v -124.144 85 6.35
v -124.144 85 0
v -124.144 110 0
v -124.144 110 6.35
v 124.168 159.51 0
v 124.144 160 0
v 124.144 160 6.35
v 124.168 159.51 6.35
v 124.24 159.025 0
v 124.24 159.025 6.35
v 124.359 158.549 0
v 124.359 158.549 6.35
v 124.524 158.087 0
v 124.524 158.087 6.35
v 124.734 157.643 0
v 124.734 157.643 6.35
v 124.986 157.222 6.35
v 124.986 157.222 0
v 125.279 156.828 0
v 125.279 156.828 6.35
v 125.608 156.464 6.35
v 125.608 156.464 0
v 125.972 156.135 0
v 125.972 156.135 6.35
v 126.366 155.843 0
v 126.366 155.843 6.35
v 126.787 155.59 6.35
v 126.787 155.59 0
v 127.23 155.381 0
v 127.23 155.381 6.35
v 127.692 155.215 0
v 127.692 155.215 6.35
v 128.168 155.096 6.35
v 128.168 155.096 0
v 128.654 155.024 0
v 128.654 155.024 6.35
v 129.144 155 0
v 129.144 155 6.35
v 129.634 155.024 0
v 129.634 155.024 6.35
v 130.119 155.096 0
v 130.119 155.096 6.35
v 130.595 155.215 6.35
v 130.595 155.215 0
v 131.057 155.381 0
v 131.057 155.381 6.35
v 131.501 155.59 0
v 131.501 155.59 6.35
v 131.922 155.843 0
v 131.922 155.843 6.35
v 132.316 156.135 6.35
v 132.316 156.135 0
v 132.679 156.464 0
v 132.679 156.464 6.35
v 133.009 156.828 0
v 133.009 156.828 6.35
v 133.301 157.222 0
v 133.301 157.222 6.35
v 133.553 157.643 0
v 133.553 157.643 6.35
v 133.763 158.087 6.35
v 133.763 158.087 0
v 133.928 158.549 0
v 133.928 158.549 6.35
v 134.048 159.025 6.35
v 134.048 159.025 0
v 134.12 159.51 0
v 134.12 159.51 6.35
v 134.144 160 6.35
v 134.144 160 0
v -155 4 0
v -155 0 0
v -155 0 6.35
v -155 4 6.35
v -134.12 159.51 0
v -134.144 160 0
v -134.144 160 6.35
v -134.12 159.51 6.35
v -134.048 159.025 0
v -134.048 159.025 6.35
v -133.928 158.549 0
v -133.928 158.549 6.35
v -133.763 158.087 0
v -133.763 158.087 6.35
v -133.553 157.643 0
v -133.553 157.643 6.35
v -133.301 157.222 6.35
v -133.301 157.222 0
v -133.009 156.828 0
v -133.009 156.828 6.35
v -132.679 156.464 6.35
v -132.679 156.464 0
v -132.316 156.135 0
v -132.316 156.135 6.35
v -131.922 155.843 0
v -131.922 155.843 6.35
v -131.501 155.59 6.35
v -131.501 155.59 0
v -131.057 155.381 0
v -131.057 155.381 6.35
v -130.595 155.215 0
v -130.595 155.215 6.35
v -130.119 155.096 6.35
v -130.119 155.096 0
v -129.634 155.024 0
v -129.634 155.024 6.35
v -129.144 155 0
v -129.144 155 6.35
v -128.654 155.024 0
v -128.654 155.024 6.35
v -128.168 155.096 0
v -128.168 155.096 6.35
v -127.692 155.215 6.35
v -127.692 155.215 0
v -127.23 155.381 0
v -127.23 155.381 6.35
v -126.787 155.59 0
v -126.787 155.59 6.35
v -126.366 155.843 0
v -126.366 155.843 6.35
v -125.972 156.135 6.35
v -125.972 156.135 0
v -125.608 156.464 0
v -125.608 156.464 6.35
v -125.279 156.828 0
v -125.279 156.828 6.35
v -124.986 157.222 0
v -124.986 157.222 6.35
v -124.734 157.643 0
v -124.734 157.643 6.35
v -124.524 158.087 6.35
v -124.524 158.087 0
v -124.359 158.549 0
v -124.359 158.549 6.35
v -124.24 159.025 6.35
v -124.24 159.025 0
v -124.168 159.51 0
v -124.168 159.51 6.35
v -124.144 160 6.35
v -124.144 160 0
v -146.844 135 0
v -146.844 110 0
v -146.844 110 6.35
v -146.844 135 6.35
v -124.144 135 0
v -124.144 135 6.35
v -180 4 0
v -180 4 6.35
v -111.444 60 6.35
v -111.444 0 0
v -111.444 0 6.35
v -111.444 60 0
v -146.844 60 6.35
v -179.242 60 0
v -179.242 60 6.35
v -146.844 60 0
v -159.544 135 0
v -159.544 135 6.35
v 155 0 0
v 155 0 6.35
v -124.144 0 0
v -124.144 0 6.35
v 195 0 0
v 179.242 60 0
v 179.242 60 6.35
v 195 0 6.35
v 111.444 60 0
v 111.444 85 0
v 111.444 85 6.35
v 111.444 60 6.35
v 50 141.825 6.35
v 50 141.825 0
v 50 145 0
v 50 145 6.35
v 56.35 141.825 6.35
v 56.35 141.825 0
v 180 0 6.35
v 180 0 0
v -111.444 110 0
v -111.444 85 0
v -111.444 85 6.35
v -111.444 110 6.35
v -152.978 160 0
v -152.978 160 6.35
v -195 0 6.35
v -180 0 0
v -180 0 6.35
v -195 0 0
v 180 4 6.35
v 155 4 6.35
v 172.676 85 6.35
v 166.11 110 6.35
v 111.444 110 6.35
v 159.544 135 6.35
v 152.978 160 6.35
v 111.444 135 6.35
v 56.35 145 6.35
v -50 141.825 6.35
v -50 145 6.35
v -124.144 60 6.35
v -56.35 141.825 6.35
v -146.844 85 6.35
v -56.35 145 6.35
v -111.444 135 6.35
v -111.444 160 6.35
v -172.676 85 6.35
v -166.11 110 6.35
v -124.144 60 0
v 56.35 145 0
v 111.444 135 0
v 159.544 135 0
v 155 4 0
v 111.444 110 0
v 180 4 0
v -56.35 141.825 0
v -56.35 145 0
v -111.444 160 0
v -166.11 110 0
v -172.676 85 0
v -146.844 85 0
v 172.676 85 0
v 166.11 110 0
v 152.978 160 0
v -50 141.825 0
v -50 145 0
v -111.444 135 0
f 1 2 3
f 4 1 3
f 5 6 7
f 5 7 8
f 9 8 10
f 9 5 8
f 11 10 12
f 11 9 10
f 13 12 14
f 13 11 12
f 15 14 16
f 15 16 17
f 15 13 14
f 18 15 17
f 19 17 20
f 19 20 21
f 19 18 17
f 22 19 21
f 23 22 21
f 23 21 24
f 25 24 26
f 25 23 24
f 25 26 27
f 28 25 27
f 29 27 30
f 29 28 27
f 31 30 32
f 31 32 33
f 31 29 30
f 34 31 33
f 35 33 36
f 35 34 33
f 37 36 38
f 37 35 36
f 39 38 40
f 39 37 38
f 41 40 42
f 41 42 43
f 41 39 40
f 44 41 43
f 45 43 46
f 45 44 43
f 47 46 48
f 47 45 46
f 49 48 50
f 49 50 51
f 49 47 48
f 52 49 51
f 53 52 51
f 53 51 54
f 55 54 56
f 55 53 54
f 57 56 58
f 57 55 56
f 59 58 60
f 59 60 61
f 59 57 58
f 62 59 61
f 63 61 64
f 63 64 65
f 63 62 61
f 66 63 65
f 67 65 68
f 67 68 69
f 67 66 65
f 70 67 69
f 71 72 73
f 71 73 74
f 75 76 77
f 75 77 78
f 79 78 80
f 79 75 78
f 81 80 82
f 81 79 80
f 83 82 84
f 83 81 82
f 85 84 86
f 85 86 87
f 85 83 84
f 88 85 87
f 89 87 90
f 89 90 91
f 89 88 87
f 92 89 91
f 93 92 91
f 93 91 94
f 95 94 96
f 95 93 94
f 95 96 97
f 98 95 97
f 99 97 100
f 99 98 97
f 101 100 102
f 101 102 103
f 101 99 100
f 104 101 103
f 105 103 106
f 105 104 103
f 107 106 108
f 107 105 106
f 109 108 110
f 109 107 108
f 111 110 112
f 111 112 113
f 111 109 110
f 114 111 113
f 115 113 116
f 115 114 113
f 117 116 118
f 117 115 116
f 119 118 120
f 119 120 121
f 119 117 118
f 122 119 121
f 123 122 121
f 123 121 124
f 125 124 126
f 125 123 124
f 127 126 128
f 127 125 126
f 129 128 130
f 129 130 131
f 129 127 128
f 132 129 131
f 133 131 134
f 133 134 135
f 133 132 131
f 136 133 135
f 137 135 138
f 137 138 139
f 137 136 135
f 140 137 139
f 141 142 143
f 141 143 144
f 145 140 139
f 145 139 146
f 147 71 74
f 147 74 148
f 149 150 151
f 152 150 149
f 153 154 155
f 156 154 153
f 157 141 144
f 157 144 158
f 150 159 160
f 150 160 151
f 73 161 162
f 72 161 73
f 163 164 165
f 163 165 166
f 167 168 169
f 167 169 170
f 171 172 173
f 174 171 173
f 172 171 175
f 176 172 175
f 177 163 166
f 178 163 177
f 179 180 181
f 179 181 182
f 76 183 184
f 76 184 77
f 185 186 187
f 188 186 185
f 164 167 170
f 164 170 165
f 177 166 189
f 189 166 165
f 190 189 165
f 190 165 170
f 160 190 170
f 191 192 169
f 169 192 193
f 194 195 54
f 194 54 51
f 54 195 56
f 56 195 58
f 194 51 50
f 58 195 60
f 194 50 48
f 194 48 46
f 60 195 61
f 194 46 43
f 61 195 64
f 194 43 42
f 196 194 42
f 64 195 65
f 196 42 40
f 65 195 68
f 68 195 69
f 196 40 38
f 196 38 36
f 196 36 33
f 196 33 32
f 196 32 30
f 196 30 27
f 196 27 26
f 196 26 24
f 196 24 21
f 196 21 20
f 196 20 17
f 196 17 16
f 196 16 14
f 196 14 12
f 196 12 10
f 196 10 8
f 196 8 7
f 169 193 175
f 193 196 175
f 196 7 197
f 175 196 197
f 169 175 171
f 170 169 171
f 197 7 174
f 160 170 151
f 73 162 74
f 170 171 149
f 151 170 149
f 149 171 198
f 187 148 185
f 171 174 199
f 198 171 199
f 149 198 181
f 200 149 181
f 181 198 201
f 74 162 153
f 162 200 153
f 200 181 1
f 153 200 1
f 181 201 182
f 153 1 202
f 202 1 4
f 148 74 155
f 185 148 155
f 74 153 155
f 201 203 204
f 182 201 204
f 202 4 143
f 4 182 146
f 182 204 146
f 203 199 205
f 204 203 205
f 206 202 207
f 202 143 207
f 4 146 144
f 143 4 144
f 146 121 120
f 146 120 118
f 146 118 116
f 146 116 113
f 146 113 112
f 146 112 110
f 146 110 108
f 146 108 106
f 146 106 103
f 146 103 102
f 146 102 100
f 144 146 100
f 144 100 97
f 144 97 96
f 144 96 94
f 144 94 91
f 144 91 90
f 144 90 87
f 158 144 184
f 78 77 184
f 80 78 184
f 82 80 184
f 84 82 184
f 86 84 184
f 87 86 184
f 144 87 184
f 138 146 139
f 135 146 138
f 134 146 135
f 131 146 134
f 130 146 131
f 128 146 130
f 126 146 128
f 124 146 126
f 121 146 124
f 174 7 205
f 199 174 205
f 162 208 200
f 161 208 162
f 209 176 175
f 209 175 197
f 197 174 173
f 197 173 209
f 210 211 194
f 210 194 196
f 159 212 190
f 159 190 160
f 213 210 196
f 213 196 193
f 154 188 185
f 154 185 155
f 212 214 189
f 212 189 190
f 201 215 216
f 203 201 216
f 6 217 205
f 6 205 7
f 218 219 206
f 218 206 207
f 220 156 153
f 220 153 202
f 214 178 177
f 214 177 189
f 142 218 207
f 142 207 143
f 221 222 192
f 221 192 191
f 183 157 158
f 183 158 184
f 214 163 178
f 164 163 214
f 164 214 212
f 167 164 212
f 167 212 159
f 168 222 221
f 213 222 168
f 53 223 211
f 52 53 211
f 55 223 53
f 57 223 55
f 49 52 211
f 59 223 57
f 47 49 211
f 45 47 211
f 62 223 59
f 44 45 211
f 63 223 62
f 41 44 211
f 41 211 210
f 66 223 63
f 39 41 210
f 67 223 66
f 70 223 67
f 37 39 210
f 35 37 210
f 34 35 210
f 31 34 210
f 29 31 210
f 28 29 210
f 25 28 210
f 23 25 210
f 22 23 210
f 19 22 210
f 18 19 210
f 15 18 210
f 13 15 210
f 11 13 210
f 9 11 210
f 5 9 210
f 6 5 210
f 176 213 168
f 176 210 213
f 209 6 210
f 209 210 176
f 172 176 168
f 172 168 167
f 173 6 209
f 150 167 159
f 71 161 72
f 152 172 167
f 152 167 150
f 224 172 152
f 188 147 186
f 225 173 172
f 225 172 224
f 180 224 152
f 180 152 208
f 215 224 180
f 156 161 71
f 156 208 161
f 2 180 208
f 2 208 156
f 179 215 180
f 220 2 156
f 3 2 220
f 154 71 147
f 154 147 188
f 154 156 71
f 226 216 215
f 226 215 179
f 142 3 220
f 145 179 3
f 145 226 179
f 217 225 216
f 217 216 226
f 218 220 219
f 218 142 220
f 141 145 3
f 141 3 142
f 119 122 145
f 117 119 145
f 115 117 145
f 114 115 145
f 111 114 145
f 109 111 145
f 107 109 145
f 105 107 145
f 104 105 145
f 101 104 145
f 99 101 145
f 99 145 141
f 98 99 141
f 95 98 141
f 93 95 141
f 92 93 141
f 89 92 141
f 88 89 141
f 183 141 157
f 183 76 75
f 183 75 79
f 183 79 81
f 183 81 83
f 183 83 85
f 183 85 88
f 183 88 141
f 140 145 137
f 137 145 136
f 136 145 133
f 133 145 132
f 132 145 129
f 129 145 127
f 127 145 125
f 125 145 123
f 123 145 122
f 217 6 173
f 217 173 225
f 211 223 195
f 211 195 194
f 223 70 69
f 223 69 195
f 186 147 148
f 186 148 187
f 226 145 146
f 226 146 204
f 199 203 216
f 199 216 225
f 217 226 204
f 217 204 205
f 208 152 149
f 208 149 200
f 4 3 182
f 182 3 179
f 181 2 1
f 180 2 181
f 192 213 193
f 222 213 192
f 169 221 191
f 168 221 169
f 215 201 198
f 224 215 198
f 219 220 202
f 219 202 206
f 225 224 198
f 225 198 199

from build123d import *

# Parameters (mm, degrees)
SKETCH1_W      = 6.35
SKETCH1_H      = 3.175
SKETCH1_W_2    = 12.7
SKETCH1_H_2    = 25
EXTRUDE1_DEPTH = 6.35


with BuildPart() as part:
    # Sketch1 → Extrude1 (new body)
    with BuildSketch(Plane.XY):
        with BuildLine():
            Line((-155, 0), (-155, 4))
            Line((-155, 4), (-180, 4))
            Line((-180, 4), (-180, 0))
            Line((-180, 0), (-195, 0))
            Line((-195, 0), (-179.241666667, 60))
            Line((-179.241666667, 60), (-146.84375, 60))
            Line((-146.84375, 60), (-146.84375, 85))
            Line((-146.84375, 85), (-172.675694444, 85))
            Line((-172.675694444, 85), (-166.109722222, 110))
            Line((-166.109722222, 110), (-146.84375, 110))
            Line((-146.84375, 110), (-146.84375, 135))
            Line((-146.84375, 135), (-159.54375, 135))
            Line((-159.54375, 135), (-152.977777778, 160))
            Line((-152.977777778, 160), (-134.14375, 160))
            ThreePointArc((-134.14375, 160), (-129.14375, 155), (-124.14375, 160))
            Line((-124.14375, 160), (-124.14375, 135))
            Line((-124.14375, 135), (-111.44375, 135))
            Line((-111.44375, 135), (-111.44375, 160))
            Line((-111.44375, 160), (0, 160))
            Line((0, 160), (124.14375, 160))
            ThreePointArc((124.14375, 160), (129.14375, 155), (134.14375, 160))
            Line((134.14375, 160), (152.977777778, 160))
            Line((152.977777778, 160), (159.54375, 135))
            Line((159.54375, 135), (111.44375, 135))
            Line((111.44375, 135), (111.44375, 110))
            Line((111.44375, 110), (166.109722222, 110))
            Line((166.109722222, 110), (172.675694444, 85))
            Line((172.675694444, 85), (111.44375, 85))
            Line((111.44375, 85), (111.44375, 60))
            Line((111.44375, 60), (179.241666667, 60))
            Line((179.241666667, 60), (195, 0))
            Line((195, 0), (180, 0))
            Line((180, 0), (180, 4))
            Line((180, 4), (155, 4))
            Line((155, 4), (155, 0))
            Line((155, 0), (-111.44375, 0))
            Line((-111.44375, 0), (-111.44375, 60))
            Line((-111.44375, 60), (-124.14375, 60))
            Line((-124.14375, 60), (-124.14375, 0))
            Line((-124.14375, 0), (-155, 0))
        make_face()
        with Locations((-53.175, 143.4125)):
            Rectangle(SKETCH1_W, SKETCH1_H, mode=Mode.SUBTRACT)
        with Locations((-117.79375, 97.5)):
            Rectangle(SKETCH1_W_2, SKETCH1_H_2, mode=Mode.SUBTRACT)
        with Locations((53.175, 143.4125)):
            Rectangle(SKETCH1_W, SKETCH1_H, mode=Mode.SUBTRACT)
    extrude(amount=EXTRUDE1_DEPTH)


solid = part.part
